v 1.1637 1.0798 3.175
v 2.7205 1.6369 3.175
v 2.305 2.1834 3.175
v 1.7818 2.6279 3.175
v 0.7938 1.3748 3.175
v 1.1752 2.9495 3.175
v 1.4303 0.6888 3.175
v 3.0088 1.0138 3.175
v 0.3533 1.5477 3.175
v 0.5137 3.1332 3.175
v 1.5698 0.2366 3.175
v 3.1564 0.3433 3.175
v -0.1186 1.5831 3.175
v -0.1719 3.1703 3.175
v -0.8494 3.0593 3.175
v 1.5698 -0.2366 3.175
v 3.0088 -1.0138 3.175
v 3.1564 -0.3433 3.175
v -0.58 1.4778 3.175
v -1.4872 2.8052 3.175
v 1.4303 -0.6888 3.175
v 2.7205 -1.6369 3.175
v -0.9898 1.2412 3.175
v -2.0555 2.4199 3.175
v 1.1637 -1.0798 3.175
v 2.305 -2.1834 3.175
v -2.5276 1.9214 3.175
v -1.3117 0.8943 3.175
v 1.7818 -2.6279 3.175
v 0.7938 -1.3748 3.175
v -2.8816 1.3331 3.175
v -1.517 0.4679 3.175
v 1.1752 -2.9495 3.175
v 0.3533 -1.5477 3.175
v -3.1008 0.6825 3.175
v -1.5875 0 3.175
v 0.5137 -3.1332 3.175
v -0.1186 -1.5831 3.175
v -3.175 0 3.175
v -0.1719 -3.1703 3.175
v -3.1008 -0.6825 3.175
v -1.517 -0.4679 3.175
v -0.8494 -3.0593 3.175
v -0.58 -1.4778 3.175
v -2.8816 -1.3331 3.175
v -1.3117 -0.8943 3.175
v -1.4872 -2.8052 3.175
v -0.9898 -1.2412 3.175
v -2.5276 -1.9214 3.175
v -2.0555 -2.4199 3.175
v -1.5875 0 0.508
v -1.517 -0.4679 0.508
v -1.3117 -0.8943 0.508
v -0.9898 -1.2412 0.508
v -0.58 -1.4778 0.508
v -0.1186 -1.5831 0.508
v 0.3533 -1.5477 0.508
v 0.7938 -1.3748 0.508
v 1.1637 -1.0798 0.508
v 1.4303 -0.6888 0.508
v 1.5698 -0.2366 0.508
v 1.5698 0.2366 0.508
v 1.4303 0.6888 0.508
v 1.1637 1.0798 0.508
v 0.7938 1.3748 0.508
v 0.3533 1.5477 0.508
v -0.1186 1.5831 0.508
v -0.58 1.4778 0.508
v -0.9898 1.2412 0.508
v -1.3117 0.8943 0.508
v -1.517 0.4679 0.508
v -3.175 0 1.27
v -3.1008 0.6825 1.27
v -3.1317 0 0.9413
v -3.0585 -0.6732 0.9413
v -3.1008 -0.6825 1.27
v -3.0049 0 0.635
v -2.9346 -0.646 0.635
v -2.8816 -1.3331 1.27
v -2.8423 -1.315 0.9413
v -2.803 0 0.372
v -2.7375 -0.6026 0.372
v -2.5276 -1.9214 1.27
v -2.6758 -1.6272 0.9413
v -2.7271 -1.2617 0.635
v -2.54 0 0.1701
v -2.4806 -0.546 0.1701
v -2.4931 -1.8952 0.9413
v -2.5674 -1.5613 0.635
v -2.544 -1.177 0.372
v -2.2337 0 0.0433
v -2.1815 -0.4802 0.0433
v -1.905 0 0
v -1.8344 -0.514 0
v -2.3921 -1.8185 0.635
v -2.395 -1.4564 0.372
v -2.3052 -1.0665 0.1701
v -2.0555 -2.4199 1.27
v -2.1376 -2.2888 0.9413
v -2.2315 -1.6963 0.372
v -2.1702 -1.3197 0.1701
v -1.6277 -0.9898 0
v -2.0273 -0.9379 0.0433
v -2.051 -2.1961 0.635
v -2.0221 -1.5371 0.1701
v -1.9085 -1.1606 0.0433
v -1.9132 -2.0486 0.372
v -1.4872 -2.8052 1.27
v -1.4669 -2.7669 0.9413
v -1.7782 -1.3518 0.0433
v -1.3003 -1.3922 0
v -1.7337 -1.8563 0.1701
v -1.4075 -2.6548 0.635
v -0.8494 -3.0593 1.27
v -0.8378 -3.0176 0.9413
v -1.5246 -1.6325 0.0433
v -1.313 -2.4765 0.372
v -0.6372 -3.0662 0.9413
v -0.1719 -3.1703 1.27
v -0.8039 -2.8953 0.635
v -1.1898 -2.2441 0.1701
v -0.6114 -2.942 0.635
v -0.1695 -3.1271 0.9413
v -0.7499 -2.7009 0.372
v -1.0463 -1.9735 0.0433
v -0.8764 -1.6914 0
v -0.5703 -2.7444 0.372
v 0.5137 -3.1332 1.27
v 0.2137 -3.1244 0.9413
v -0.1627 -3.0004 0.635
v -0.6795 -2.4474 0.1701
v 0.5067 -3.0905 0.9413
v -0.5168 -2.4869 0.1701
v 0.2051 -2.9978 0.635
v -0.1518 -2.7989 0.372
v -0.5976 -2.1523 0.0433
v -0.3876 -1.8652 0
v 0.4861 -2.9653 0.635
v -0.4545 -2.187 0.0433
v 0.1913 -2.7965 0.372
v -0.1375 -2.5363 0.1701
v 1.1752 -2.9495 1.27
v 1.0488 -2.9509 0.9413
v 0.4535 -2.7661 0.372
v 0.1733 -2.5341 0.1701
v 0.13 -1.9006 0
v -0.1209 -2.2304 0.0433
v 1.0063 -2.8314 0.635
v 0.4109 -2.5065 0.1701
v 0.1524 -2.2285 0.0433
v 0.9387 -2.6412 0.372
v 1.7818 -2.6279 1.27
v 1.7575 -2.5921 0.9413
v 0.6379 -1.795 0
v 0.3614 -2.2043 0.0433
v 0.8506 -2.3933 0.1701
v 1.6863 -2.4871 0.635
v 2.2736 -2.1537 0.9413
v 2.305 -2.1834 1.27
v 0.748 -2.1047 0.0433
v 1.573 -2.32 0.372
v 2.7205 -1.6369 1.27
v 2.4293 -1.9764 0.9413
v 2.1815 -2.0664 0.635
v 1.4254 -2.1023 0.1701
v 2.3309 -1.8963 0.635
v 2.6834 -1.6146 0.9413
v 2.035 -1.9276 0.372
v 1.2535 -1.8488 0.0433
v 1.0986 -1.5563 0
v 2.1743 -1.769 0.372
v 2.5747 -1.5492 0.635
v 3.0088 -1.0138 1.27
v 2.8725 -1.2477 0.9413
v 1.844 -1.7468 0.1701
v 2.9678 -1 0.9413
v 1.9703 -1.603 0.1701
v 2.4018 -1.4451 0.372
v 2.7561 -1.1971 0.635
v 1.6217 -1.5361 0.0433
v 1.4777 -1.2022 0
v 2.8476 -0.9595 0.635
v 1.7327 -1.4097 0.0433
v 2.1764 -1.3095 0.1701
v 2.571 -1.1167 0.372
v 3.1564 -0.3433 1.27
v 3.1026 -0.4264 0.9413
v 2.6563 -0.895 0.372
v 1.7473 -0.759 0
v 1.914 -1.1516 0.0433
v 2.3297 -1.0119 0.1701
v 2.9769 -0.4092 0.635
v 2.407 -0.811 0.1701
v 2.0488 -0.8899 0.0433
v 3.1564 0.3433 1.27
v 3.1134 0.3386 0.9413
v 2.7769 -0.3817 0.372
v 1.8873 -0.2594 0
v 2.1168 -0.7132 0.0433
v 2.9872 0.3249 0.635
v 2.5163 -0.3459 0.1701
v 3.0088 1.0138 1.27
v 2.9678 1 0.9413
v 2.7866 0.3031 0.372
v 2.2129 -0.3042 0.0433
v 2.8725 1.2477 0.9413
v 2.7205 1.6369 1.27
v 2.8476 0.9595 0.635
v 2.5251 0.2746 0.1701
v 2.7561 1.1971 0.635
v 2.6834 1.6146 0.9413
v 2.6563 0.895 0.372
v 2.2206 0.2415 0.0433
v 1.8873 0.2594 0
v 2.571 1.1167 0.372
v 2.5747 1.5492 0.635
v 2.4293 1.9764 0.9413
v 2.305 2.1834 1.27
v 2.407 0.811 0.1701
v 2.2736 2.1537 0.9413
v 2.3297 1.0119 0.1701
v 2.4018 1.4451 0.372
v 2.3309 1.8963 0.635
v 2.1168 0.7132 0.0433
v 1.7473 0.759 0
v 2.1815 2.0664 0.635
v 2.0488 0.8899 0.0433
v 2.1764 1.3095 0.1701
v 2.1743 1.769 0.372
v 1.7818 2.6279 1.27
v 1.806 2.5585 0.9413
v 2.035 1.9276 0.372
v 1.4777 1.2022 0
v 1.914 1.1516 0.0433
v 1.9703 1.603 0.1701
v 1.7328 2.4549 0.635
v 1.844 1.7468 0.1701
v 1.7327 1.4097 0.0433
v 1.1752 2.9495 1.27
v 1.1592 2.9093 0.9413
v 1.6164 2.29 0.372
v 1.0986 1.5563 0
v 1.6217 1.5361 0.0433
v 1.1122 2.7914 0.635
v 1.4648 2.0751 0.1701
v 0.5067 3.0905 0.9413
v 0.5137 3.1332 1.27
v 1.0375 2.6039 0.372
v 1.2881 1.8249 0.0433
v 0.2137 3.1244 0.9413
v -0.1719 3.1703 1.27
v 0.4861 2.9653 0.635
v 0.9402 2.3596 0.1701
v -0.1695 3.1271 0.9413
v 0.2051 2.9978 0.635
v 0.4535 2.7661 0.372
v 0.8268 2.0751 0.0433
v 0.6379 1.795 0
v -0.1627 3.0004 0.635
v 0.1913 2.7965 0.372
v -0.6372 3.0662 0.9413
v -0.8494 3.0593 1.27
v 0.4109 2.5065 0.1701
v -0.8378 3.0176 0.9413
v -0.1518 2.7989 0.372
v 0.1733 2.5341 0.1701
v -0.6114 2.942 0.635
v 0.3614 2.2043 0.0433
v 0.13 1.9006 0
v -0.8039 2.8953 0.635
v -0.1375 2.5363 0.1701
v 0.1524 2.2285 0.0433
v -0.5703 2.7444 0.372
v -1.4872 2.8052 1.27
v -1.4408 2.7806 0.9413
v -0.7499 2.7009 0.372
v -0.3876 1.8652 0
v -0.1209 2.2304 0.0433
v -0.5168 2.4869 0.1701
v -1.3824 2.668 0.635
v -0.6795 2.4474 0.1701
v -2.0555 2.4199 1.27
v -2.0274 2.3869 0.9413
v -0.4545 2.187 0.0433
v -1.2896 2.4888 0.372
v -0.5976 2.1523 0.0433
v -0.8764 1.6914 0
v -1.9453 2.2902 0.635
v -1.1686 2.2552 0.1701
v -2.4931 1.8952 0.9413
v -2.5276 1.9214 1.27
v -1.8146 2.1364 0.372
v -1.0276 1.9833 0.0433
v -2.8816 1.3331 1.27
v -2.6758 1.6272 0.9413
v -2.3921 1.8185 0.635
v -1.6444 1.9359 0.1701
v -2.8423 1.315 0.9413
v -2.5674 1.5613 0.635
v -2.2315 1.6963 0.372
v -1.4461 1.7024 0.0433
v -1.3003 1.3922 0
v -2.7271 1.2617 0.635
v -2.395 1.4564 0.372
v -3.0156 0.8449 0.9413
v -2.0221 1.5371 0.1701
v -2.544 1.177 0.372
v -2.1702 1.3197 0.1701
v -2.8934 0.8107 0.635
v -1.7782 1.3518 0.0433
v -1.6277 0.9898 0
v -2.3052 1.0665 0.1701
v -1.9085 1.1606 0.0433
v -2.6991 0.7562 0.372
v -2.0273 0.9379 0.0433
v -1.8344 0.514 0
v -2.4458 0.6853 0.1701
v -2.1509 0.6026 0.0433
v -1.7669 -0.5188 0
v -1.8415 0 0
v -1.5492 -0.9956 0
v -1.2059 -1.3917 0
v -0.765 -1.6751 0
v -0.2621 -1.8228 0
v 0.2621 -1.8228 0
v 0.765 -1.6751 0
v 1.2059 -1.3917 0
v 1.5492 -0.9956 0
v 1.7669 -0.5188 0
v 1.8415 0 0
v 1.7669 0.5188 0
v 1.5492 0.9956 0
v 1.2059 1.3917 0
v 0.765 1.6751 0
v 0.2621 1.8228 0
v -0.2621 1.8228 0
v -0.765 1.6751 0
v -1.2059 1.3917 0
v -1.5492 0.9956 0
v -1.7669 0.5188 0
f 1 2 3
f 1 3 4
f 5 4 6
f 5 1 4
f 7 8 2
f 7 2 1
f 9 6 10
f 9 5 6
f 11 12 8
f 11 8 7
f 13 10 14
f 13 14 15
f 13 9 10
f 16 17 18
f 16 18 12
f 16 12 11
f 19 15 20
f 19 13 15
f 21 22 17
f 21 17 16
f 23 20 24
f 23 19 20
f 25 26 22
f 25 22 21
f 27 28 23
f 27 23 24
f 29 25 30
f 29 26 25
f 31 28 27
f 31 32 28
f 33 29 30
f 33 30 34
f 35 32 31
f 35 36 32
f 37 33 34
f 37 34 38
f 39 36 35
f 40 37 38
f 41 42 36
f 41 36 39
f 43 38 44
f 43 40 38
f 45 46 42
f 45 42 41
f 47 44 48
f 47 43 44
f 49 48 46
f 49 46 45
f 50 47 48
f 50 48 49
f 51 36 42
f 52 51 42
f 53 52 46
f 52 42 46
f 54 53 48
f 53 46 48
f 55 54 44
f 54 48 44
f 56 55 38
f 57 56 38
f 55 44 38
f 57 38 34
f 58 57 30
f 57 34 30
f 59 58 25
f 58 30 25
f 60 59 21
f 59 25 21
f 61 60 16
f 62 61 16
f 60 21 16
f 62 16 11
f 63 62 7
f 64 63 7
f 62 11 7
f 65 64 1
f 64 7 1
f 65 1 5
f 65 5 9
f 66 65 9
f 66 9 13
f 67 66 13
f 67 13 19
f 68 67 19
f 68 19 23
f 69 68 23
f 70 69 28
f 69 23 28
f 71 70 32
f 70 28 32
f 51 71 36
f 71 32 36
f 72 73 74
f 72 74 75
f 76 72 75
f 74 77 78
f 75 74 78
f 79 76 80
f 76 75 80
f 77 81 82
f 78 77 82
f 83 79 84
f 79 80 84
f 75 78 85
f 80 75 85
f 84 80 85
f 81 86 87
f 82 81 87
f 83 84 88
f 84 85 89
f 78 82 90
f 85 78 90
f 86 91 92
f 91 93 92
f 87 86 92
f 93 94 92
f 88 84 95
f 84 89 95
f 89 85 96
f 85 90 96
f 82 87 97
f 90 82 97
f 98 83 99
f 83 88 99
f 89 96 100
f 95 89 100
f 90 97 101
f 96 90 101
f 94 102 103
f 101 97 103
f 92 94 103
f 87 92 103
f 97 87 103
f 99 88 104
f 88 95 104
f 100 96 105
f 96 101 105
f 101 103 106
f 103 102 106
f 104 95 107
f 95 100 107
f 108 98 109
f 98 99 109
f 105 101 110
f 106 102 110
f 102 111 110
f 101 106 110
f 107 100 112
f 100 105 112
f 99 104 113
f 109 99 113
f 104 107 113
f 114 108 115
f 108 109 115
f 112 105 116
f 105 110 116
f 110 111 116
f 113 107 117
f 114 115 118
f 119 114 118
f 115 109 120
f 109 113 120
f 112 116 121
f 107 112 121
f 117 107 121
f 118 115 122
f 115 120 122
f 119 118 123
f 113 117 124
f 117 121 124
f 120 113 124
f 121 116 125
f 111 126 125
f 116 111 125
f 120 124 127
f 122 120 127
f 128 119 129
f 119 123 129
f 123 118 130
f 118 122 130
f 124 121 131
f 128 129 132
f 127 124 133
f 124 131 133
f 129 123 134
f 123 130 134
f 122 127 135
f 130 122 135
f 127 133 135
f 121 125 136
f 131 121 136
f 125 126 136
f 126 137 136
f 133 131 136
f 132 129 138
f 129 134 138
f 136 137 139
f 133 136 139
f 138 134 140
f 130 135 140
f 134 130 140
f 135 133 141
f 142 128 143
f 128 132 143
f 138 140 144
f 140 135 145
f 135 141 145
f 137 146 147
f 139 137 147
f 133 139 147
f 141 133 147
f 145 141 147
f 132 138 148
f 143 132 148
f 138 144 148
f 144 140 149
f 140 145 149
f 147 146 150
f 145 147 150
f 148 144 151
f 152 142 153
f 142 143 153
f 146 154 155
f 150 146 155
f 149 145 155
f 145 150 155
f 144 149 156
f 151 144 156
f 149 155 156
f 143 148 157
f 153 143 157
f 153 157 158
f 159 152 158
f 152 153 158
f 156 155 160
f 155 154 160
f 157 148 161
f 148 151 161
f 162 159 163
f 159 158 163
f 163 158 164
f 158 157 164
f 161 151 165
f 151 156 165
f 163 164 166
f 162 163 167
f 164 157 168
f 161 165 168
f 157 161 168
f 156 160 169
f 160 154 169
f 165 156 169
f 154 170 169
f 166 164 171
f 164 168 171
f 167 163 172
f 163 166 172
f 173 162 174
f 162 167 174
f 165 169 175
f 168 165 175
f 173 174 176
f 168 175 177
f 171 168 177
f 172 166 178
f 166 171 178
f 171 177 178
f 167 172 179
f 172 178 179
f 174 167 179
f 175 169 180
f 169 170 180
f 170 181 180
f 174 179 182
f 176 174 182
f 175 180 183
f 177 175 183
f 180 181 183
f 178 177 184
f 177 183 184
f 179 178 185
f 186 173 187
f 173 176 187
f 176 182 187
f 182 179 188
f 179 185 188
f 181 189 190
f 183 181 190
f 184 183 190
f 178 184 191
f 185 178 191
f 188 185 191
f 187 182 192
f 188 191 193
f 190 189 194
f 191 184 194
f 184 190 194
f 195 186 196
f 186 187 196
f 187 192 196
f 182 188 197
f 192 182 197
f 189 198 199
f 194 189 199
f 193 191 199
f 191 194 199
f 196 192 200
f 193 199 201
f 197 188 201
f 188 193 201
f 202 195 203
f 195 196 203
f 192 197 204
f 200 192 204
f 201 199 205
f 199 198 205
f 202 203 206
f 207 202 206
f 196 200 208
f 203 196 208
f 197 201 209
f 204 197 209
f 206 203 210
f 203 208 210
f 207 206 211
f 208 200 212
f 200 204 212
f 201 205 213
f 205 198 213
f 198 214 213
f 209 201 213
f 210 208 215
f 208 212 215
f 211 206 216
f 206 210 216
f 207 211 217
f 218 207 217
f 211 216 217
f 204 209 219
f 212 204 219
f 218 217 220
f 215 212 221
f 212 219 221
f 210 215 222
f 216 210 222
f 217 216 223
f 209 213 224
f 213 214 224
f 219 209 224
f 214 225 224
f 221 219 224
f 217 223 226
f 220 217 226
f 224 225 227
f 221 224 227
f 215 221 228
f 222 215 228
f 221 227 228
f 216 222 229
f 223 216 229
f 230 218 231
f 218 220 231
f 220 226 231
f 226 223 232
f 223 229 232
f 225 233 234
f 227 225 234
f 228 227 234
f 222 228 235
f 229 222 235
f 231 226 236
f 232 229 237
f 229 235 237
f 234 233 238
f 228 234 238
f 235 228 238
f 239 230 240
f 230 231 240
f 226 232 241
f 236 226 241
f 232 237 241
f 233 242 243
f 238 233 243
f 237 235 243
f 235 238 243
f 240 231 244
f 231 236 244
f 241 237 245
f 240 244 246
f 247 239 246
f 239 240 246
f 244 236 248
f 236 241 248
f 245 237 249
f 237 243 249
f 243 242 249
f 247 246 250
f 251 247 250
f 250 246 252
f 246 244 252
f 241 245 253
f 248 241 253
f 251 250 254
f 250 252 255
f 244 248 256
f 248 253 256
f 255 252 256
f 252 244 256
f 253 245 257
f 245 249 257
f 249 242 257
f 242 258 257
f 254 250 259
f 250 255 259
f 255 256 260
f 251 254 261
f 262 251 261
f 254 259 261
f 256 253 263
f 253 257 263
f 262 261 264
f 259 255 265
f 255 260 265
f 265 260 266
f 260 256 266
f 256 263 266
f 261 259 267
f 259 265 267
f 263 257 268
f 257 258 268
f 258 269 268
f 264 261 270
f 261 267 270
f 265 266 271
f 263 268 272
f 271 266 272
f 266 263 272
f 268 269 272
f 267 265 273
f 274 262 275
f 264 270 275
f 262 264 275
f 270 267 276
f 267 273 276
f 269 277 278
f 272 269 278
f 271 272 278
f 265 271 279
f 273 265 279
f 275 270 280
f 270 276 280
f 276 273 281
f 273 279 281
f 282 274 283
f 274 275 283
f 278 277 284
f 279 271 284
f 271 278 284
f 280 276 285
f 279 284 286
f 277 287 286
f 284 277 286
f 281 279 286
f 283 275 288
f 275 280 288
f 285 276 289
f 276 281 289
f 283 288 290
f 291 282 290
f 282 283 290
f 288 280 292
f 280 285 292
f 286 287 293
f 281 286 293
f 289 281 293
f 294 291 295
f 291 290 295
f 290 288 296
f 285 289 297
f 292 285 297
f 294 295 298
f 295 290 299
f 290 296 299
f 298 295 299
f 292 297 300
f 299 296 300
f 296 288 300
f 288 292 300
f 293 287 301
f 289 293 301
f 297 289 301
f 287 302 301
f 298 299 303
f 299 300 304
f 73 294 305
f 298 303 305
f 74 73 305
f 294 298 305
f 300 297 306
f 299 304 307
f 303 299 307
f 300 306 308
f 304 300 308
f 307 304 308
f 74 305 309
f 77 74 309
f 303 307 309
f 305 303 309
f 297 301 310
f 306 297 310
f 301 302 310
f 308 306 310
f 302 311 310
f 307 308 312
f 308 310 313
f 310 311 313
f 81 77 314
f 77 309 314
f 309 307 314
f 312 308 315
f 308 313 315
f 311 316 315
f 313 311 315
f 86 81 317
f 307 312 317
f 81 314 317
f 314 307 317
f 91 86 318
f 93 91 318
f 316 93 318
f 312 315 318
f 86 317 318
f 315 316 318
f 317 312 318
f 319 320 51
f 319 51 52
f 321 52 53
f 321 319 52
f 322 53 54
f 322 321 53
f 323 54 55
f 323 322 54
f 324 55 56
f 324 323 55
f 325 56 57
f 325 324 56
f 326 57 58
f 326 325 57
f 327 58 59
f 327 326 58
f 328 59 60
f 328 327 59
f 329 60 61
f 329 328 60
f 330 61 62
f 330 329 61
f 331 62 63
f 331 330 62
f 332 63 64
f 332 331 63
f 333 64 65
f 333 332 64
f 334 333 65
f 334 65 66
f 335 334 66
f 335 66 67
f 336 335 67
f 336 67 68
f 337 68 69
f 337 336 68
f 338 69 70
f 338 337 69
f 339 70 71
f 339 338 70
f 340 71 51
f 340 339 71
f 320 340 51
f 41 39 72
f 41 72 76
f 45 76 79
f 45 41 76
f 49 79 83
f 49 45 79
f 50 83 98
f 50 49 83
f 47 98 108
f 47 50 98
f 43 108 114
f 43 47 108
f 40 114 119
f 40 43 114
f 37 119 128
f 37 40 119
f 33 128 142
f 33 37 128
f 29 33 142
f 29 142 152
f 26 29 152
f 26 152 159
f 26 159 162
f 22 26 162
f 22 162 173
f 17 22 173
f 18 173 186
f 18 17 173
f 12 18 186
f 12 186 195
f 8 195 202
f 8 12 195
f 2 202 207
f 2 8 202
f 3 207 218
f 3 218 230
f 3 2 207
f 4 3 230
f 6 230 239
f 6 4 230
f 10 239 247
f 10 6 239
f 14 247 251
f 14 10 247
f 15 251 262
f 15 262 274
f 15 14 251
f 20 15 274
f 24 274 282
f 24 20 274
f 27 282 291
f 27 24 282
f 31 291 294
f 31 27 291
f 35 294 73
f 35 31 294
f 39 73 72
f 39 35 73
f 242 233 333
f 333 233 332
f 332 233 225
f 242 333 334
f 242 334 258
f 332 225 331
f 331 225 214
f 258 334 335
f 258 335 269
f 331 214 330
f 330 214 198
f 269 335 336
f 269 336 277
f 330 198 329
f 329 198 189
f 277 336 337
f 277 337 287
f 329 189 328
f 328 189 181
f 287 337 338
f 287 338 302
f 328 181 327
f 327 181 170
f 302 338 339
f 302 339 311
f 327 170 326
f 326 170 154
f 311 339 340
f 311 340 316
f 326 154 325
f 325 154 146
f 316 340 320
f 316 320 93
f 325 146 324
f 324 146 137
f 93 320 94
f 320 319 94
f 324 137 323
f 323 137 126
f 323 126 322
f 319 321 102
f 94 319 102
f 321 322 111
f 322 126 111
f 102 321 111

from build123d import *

# Parameters (mm, degrees)
F0_W     = 1.5875
F0_H     = 3.175
F2_R     = 1.27
F3_SIZE2 = 0.254
F3_SIZE  = 0.508


with BuildPart() as f1:
    # F0 (on Front) → F1 (revolve)
    with BuildSketch(Plane.XZ):
        with Locations((-2.38125, 1.5875)):
            Rectangle(F0_W, F0_H)
    revolve(axis=Axis((0, 0, 3.3253985457), (0, 0, 1)))

    # F2
    f2_edges = [f1.edges().sort_by_distance(p)[0] for p in [
        (3.175, 0, 0),
    ]]
    fillet(f2_edges, radius=F2_R)

    # F3
    f3_edges = [f1.edges().sort_by_distance(p)[0] for p in [
        (1.5875, 0, 0),
    ]]
    f3_side = f1.faces().sort_by_distance((1.5875, 0, 1.5875))[0]
    chamfer(f3_edges, length=F3_SIZE, length2=F3_SIZE2, reference=f3_side)


solid = f1.part
